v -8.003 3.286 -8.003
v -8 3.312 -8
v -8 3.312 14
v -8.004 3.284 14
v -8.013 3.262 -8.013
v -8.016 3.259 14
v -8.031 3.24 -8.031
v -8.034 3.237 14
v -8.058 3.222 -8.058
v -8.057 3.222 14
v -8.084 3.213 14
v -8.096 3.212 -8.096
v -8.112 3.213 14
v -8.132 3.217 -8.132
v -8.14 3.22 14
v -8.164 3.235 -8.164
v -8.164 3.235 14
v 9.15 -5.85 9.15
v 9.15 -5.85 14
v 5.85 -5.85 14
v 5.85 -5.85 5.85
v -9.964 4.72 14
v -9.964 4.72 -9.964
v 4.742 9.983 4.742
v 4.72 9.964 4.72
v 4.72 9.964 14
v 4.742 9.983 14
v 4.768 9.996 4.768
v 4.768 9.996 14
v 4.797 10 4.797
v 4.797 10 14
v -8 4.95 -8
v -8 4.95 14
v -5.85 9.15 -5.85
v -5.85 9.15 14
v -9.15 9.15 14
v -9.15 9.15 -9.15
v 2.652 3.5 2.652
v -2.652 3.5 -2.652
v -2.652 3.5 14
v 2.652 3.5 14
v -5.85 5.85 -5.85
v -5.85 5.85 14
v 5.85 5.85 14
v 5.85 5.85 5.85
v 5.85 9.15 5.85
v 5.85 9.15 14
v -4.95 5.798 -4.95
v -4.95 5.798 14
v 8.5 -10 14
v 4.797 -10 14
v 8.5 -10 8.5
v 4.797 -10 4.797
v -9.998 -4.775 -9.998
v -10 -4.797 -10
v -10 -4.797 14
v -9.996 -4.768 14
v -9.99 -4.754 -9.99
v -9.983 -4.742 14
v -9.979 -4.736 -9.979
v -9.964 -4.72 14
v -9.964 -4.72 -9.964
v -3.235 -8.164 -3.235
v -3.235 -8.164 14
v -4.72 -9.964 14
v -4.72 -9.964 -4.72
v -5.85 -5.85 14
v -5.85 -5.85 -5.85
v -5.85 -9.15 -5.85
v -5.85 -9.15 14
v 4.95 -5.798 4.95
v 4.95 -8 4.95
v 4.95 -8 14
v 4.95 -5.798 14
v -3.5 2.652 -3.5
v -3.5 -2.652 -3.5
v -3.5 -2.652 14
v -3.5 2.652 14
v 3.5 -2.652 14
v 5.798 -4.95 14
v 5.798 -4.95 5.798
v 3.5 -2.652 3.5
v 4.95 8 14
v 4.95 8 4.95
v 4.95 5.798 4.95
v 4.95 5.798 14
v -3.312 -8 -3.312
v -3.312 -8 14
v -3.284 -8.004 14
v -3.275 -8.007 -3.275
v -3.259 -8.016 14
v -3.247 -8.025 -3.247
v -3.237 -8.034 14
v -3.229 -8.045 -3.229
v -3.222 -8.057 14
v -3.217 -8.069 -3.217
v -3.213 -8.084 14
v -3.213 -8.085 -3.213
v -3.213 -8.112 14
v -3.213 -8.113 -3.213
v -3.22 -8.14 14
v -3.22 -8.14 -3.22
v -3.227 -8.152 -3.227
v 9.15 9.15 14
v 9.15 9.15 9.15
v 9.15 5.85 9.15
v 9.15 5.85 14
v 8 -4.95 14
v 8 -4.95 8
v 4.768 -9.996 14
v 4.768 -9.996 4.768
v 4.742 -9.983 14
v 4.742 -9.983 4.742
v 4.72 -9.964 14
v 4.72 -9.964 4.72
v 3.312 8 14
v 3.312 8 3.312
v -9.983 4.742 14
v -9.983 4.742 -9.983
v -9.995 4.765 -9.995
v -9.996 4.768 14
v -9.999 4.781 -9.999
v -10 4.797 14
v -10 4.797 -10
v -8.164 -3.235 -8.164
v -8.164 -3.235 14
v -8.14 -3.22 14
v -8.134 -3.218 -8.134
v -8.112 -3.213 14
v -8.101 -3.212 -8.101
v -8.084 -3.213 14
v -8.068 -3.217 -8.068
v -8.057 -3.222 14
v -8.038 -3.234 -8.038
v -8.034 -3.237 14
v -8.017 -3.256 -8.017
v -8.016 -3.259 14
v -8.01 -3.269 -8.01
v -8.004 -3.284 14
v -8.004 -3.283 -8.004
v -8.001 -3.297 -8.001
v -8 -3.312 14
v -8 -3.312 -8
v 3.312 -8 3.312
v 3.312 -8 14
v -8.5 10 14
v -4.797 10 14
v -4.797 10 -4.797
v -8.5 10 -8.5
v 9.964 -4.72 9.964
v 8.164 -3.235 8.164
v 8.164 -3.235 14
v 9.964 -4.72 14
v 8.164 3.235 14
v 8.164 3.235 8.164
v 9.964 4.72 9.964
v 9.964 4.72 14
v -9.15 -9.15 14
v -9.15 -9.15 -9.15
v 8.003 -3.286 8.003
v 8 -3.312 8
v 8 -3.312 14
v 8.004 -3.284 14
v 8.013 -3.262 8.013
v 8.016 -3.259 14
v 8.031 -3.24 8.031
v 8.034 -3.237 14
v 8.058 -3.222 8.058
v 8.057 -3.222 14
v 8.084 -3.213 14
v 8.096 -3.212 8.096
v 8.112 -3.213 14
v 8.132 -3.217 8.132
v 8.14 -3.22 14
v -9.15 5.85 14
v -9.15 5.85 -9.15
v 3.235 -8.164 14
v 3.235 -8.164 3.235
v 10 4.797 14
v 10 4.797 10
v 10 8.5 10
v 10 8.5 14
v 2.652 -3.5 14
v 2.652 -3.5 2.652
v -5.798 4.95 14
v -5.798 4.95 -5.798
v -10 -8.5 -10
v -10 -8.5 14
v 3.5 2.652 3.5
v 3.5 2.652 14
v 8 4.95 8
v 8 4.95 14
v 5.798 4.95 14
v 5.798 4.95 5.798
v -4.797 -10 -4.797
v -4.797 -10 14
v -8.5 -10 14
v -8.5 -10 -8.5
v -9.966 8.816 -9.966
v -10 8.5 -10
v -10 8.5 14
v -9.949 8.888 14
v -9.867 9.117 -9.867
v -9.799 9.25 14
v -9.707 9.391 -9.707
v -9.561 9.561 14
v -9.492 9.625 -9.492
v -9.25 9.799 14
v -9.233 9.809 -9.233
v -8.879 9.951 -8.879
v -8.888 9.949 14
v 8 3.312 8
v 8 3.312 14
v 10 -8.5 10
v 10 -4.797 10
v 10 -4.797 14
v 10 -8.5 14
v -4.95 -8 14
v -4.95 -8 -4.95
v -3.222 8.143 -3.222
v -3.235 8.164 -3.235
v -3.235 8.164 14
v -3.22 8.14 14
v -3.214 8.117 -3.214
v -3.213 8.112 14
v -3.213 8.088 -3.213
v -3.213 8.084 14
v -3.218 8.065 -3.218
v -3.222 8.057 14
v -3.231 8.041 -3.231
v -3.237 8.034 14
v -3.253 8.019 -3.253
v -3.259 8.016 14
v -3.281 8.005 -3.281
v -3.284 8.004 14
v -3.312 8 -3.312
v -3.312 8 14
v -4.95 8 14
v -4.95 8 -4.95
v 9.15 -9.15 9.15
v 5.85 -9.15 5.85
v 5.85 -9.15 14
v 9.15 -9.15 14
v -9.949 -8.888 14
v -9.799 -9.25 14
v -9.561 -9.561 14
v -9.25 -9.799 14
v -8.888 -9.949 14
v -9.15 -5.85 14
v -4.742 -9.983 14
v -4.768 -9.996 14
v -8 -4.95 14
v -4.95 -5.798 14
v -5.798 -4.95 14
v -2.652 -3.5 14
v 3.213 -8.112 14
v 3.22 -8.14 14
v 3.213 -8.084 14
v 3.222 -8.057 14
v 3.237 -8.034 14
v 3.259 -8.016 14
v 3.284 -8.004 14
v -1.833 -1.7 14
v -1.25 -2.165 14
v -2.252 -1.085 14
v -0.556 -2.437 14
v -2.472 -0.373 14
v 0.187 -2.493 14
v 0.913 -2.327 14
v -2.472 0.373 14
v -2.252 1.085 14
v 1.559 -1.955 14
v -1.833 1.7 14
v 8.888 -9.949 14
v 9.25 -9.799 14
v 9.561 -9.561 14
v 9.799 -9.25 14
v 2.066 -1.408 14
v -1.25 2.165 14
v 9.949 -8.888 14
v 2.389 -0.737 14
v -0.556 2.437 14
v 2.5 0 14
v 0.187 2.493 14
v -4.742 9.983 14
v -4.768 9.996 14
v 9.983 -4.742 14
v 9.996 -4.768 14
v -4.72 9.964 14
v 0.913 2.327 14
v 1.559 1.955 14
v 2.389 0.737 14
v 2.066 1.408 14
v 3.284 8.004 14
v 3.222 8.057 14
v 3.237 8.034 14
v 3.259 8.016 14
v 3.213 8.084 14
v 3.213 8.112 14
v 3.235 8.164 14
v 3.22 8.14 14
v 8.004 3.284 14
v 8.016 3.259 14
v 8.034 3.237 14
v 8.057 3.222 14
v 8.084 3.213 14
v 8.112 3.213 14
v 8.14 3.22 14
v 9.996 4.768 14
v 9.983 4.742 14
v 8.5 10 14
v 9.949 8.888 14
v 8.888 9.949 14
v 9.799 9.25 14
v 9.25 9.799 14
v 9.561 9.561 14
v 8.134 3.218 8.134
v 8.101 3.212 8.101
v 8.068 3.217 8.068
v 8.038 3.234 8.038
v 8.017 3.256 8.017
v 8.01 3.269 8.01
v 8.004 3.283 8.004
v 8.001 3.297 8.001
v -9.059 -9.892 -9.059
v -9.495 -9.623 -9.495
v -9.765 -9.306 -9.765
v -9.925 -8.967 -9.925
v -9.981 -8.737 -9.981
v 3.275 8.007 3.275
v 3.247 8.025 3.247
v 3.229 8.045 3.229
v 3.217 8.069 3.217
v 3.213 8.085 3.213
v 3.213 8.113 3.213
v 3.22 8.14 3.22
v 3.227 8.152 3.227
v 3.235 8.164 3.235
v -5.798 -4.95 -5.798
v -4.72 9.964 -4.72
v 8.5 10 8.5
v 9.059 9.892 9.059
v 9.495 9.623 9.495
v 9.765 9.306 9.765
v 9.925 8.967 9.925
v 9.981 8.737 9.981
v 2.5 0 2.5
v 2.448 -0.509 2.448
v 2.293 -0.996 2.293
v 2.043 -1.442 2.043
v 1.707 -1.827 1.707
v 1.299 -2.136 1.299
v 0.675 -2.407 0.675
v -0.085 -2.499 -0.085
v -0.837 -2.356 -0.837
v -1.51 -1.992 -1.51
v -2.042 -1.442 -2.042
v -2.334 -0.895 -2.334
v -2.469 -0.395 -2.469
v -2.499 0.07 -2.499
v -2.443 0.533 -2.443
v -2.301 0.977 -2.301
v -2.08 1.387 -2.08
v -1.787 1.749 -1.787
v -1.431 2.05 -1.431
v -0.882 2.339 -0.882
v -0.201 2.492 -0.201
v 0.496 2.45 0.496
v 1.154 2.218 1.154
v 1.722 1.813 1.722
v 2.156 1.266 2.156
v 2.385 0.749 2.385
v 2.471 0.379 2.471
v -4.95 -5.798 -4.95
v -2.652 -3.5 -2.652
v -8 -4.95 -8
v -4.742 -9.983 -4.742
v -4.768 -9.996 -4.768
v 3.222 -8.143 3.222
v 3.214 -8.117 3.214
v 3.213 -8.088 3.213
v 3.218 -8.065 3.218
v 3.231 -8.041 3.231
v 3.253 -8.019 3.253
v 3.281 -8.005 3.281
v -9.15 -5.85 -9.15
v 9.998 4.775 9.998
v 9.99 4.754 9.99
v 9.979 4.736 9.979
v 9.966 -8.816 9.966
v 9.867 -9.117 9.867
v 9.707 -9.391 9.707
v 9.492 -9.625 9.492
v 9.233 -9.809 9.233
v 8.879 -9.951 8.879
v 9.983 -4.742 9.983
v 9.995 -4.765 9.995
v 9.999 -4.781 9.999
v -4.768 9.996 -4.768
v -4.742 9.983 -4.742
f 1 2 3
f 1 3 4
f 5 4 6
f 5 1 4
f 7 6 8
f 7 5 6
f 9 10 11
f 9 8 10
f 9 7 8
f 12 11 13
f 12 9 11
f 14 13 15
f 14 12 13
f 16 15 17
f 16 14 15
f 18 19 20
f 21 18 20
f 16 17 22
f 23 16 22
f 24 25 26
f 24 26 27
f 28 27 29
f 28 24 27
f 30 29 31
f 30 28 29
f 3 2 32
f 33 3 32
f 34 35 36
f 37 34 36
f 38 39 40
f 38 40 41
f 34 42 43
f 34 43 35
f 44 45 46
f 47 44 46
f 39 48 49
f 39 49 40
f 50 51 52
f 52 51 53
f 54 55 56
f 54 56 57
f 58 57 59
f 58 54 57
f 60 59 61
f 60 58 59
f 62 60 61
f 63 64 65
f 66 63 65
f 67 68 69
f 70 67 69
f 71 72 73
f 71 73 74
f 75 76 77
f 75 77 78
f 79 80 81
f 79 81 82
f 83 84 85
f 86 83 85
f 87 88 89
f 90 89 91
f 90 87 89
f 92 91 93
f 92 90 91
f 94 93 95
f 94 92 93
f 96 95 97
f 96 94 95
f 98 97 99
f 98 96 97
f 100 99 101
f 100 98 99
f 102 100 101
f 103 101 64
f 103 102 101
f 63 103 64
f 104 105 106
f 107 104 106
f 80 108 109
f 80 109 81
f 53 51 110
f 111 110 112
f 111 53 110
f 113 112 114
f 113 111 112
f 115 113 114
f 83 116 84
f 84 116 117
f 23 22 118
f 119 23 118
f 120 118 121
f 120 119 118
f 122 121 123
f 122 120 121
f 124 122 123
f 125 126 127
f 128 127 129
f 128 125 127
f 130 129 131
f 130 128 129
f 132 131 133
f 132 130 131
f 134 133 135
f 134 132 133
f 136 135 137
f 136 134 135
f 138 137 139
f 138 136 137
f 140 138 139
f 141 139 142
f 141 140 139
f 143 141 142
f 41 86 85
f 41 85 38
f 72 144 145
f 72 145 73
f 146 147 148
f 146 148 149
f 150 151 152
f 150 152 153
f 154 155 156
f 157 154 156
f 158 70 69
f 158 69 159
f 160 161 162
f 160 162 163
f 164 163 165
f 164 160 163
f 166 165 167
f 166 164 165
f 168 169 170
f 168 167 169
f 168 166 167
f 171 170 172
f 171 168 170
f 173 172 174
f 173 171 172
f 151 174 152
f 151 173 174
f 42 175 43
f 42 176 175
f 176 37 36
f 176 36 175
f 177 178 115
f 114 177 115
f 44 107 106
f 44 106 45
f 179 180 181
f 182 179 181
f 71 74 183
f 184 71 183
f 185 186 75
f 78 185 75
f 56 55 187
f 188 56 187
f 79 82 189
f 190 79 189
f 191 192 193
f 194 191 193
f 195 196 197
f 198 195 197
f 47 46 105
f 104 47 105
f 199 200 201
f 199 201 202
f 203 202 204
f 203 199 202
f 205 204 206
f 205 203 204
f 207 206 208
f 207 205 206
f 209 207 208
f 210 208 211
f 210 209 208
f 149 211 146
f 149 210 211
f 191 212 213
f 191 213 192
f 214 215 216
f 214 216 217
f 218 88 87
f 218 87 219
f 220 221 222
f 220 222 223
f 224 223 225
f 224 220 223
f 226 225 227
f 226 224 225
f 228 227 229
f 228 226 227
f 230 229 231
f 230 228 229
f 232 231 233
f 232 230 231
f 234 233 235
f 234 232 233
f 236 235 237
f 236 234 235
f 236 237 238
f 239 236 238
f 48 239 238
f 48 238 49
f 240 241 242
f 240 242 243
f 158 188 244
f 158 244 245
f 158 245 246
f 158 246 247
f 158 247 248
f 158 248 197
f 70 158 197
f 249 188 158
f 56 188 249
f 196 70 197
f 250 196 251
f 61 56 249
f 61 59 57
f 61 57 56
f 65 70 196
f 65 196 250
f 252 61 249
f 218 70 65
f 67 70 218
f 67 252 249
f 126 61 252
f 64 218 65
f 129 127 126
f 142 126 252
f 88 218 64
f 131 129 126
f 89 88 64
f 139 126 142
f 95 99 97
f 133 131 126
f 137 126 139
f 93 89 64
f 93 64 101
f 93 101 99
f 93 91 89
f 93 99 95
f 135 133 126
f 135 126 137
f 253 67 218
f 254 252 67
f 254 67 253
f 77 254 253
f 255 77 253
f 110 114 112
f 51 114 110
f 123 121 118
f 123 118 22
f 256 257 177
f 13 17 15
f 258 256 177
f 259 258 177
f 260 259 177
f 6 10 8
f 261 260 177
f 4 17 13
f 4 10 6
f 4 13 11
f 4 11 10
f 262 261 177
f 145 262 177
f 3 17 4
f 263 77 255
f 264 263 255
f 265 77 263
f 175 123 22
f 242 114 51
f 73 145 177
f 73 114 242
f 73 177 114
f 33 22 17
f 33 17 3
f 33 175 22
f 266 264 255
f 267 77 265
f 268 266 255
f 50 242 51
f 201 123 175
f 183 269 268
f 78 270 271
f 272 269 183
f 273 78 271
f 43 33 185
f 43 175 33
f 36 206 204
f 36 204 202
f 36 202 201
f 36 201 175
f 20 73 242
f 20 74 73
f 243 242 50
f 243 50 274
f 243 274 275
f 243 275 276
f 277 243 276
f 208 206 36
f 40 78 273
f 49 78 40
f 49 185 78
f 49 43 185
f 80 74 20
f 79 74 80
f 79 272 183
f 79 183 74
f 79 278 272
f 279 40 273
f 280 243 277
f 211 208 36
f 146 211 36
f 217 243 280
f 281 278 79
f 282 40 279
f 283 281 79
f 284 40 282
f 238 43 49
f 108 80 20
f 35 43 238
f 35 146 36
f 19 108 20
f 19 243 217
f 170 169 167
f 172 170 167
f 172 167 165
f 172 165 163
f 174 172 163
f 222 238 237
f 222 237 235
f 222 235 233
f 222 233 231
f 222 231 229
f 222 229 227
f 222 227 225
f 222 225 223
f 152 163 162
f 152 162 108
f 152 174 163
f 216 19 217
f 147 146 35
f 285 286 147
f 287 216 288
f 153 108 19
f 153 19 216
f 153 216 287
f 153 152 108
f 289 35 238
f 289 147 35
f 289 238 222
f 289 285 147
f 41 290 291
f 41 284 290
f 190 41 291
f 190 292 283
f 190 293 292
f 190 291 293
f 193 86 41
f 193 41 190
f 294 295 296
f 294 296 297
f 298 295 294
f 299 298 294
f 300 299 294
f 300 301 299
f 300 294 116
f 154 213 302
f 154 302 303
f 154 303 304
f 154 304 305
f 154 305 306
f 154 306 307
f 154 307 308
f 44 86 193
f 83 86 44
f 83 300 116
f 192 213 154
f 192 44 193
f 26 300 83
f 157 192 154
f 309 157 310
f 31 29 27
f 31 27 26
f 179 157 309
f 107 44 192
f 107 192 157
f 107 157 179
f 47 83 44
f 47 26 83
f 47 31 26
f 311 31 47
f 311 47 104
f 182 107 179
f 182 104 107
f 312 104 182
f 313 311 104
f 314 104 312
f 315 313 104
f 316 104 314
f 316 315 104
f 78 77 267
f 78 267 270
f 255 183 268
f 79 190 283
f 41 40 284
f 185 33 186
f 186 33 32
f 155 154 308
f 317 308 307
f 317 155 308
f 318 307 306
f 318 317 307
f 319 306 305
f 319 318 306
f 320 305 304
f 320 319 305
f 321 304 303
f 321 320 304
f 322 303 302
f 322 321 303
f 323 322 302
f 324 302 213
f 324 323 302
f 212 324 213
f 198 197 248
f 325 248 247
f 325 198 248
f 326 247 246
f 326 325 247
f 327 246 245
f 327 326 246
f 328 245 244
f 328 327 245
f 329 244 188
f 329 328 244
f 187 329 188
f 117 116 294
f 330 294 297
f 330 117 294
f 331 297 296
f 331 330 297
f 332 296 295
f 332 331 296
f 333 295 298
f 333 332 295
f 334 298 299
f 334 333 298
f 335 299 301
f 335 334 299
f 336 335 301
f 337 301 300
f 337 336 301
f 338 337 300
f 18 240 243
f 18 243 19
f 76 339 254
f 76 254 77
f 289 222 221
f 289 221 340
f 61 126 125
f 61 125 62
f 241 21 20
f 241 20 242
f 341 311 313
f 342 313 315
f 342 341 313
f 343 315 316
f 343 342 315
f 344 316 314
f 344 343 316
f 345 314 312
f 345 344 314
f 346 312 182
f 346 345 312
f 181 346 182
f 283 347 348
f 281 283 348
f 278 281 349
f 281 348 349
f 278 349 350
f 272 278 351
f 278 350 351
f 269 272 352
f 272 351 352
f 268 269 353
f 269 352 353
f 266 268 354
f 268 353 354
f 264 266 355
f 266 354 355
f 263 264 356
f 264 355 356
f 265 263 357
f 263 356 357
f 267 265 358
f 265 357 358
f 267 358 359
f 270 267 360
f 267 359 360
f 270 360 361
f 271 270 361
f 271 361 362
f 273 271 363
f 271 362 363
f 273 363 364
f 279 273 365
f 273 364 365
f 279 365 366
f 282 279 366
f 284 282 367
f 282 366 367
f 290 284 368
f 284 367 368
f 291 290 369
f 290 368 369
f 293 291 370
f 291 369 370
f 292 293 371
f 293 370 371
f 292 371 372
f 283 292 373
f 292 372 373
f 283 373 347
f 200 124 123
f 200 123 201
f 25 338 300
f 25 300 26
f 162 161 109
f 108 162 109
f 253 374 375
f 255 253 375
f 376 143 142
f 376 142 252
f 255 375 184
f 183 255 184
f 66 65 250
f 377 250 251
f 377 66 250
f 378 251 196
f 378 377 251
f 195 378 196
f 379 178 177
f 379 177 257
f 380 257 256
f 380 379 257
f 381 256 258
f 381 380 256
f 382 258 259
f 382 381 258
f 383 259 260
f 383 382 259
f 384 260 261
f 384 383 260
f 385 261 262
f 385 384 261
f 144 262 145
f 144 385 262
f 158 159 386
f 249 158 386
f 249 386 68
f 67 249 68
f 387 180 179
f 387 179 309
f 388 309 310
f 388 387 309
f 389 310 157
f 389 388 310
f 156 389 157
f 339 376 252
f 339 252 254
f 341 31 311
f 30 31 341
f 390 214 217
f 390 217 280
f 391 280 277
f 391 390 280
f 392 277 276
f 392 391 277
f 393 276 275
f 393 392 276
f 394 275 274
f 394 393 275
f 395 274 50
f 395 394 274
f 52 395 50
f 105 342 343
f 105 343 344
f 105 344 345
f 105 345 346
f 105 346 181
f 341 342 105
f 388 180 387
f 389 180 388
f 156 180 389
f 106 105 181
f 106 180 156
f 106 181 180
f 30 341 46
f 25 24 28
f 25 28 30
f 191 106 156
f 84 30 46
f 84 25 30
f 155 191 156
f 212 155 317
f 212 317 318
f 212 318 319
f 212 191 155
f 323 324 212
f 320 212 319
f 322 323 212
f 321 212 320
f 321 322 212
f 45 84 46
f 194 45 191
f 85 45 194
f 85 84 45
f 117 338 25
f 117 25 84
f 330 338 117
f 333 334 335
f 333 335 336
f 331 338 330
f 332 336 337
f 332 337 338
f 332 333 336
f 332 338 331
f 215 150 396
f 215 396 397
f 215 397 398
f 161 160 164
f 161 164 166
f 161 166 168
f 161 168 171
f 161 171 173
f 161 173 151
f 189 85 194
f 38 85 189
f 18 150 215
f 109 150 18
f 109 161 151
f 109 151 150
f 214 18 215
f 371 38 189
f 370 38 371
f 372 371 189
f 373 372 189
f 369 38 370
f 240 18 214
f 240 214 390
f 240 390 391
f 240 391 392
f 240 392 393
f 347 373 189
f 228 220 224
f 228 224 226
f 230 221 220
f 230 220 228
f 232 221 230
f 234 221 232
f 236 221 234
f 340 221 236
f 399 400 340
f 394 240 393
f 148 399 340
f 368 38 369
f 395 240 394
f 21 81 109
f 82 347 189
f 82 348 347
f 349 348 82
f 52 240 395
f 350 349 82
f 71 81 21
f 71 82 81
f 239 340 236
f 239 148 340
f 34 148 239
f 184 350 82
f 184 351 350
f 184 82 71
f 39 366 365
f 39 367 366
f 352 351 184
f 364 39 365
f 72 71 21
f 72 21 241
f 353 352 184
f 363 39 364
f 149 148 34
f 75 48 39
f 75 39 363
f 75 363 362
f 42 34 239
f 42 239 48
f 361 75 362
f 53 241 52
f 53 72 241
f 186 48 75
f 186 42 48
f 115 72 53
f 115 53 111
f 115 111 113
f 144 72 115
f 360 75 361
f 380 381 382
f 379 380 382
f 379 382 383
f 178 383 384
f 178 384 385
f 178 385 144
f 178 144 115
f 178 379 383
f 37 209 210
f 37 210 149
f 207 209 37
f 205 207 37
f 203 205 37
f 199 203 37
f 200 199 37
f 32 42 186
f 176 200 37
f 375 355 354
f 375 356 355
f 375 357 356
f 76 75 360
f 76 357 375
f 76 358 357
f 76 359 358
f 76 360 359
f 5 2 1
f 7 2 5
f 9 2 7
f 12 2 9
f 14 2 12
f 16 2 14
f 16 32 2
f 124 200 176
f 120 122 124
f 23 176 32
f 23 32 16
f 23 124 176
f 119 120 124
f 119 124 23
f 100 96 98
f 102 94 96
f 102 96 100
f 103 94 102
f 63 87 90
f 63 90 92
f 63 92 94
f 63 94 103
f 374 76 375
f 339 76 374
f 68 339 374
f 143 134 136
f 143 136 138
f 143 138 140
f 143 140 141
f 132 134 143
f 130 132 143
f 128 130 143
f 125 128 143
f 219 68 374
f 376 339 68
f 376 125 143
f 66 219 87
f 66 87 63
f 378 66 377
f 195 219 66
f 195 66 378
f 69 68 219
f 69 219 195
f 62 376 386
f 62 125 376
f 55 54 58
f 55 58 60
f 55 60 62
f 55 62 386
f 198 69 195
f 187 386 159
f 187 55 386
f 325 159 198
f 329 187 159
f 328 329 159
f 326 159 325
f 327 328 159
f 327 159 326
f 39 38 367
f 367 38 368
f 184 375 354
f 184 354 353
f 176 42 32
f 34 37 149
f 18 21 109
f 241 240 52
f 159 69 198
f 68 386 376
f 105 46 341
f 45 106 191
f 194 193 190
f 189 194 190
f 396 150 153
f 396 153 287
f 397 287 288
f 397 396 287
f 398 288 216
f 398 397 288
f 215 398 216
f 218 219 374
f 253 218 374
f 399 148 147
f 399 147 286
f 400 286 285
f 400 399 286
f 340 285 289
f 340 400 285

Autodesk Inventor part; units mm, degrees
ref_plane "Начальная плоскость" through (0, 0, -10) normal (0, 0, 1) x (1, 0, 0)
ref_plane "Конечная плоскость" through (0, 0, 14) normal (0, 0, 1) x (1, 0, 0)
sketch "Эскиз" plane through (0, 0, 0) normal (0, 0, 1) x (1, 0, 0)
  line L0 (-14.4349, 0) -> (14.4349, 0) projected
  line L1 (0, -14) -> (0, 14) projected
  line L2 (0, 0) -> (7.5, 7.5) construction
  circle A0 centre (7.5, 7.5) radius 1.65 construction
  line L3 (5.85, 9.15) -> (9.15, 9.15)
  line L4 (9.15, 9.15) -> (9.15, 5.85)
  line L5 (9.15, 5.85) -> (5.85, 5.85)
  line L6 (5.85, 5.85) -> (5.85, 9.15)
  line L7 (3.235, 8.1636) -> (4.72, 9.9636)
  line L8 (4.7971, 10) -> (8.5, 10)
  line L9 (3.3121, 8) -> (4.95, 8)
  line L10 (4.95, 8) -> (4.95, 5.7985)
  line L11 (4.95, 5.7985) -> (2.6515, 3.5)
  line L12 (0, 3.5) -> (2.6515, 3.5)
  circle A1 centre (0, 0) radius 2.5
  line L13 (8.1636, 3.235) -> (9.9636, 4.72)
  line L14 (10, 4.7971) -> (10, 8.5)
  line L15 (8, 3.3121) -> (8, 4.95)
  line L16 (8, 4.95) -> (5.7985, 4.95)
  line L17 (5.7985, 4.95) -> (3.5, 2.6515)
  line L18 (3.5, 0) -> (3.5, 2.6515)
  arc A2 (10, 8.5) -> (8.5, 10) centre (8.5, 8.5) ccw
  line L19 (0, 0) -> (-7.5, 7.5) construction
  circle A3 centre (-7.5, 7.5) radius 1.65 construction
  line L20 (-5.85, 9.15) -> (-9.15, 9.15)
  line L21 (-9.15, 9.15) -> (-9.15, 5.85)
  line L22 (-9.15, 5.85) -> (-5.85, 5.85)
  line L23 (-5.85, 5.85) -> (-5.85, 9.15)
  line L24 (-3.235, 8.1636) -> (-4.72, 9.9636)
  line L25 (-4.7971, 10) -> (-8.5, 10)
  line L26 (-3.3121, 8) -> (-4.95, 8)
  line L27 (-4.95, 8) -> (-4.95, 5.7985)
  line L28 (-4.95, 5.7985) -> (-2.6515, 3.5)
  line L29 (0, 3.5) -> (-2.6515, 3.5)
  line L30 (-3.5, 0) -> (-3.5, 2.6515)
  line L31 (-5.7985, 4.95) -> (-3.5, 2.6515)
  line L32 (-8, 4.95) -> (-5.7985, 4.95)
  line L33 (-8, 3.3121) -> (-8, 4.95)
  line L34 (-8.1636, 3.235) -> (-9.9636, 4.72)
  line L35 (-10, 4.7971) -> (-10, 8.5)
  arc A4 (-8.5, 10) -> (-10, 8.5) centre (-8.5, 8.5) ccw
  line L36 (0, 14) -> (0, -14)
  line L37 (0, 0) -> (7.5, -7.5) construction
  circle A5 centre (7.5, -7.5) radius 1.65 construction
  line L38 (5.85, -9.15) -> (9.15, -9.15)
  line L39 (9.15, -9.15) -> (9.15, -5.85)
  line L40 (9.15, -5.85) -> (5.85, -5.85)
  line L41 (5.85, -5.85) -> (5.85, -9.15)
  line L42 (3.235, -8.1636) -> (4.72, -9.9636)
  line L43 (4.7971, -10) -> (8.5, -10)
  line L44 (3.3121, -8) -> (4.95, -8)
  line L45 (4.95, -8) -> (4.95, -5.7985)
  line L46 (4.95, -5.7985) -> (2.6515, -3.5)
  line L47 (0, -3.5) -> (2.6515, -3.5)
  line L48 (3.5, 0) -> (3.5, -2.6515)
  line L49 (5.7985, -4.95) -> (3.5, -2.6515)
  line L50 (8, -4.95) -> (5.7985, -4.95)
  line L51 (8, -3.3121) -> (8, -4.95)
  line L52 (8.1636, -3.235) -> (9.9636, -4.72)
  line L53 (10, -4.7971) -> (10, -8.5)
  arc A6 (8.5, -10) -> (10, -8.5) centre (8.5, -8.5) ccw
  line L54 (0, 0) -> (-7.5, -7.5) construction
  line L55 (-4.95, -8) -> (-4.95, -5.7985)
  line L56 (-3.3121, -8) -> (-4.95, -8)
  line L57 (-5.7985, -4.95) -> (-3.5, -2.6515)
  line L58 (-4.95, -5.7985) -> (-2.6515, -3.5)
  line L59 (-3.5, 0) -> (-3.5, -2.6515)
  line L60 (0, -3.5) -> (-2.6515, -3.5)
  circle A7 centre (-7.5, -7.5) radius 1.65 construction
  line L61 (-5.85, -5.85) -> (-5.85, -9.15)
  line L62 (-5.85, -9.15) -> (-9.15, -9.15)
  line L63 (-9.15, -9.15) -> (-9.15, -5.85)
  line L64 (-9.15, -5.85) -> (-5.85, -5.85)
  line L65 (-3.235, -8.1636) -> (-4.72, -9.9636)
  line L66 (-8, -4.95) -> (-5.7985, -4.95)
  line L67 (-8, -3.3121) -> (-8, -4.95)
  line L68 (-8.1636, -3.235) -> (-9.9636, -4.72)
  line L69 (-4.7971, -10) -> (-8.5, -10)
  line L70 (-10, -4.7971) -> (-10, -8.5)
  arc A8 (-10, -8.5) -> (-8.5, -10) centre (-8.5, -8.5) ccw
  arc A9 (3.235, 8.1636) -> (3.3121, 8) centre (3.3121, 8.1) ccw
  arc A10 (4.7971, 10) -> (4.72, 9.9636) centre (4.7971, 9.9) ccw
  arc A11 (8, 3.3121) -> (8.1636, 3.235) centre (8.1, 3.3121) ccw
  arc A12 (9.9636, 4.72) -> (10, 4.7971) centre (9.9, 4.7971) ccw
  arc A13 (-3.3121, 8) -> (-3.235, 8.1636) centre (-3.3121, 8.1) ccw
  arc A14 (-4.72, 9.9636) -> (-4.7971, 10) centre (-4.7971, 9.9) ccw
  arc A15 (-8.1636, 3.235) -> (-8, 3.3121) centre (-8.1, 3.3121) ccw
  arc A16 (-10, 4.7971) -> (-9.9636, 4.72) centre (-9.9, 4.7971) ccw
  arc A17 (-8, -3.3121) -> (-8.1636, -3.235) centre (-8.1, -3.3121) ccw
  arc A18 (-9.9636, -4.72) -> (-10, -4.7971) centre (-9.9, -4.7971) ccw
  arc A19 (-3.235, -8.1636) -> (-3.3121, -8) centre (-3.3121, -8.1) ccw
  arc A20 (-4.7971, -10) -> (-4.72, -9.9636) centre (-4.7971, -9.9) ccw
  arc A21 (4.72, -9.9636) -> (4.7971, -10) centre (4.7971, -9.9) ccw
  arc A22 (3.3121, -8) -> (3.235, -8.1636) centre (3.3121, -8.1) ccw
  arc A23 (8.1636, -3.235) -> (8, -3.3121) centre (8.1, -3.3121) ccw
  arc A24 (10, -4.7971) -> (9.9636, -4.72) centre (9.9, -4.7971) ccw
  point P0 (3.1, 8)
  point P1 (4.75, 10)
  point P2 (7.5, 9.15)
  point P3 (8, 3.1)
  point P4 (10, 4.75)
  point P5 (7.5, 5.85)
  point P6 (9.15, 7.5)
  point P7 (-3.1, 8)
  point P8 (-4.75, 10)
  point P9 (-7.5, 9.15)
  point P10 (-8, 3.1)
  point P11 (-10, 4.75)
  point P12 (-7.5, 5.85)
  point P13 (-9.15, 7.5)
  point P14 (3.1, -8)
  point P15 (4.75, -10)
  point P16 (7.5, -9.15)
  point P17 (8, -3.1)
  point P18 (10, -4.75)
  point P19 (7.5, -5.85)
  point P20 (9.15, -7.5)
  point P21 (-3.1, -8)
  point P22 (-7.5, -5.85)
  point P23 (-7.5, -9.15)
  point P24 (-9.15, -7.5)
  point P25 (-4.75, -10)
  point P26 (-8, -3.1)
  point P27 (-10, -4.75)
  dimension "d0" = 45
  dimension "d1" = 3.3
  dimension "d2" = 1.5
  dimension "d3" = 1.2
  dimension "d4" = 5
  dimension "d5" = 6.5
  dimension "d6" = 15
  dimension "d7" = 20
  dimension "d8" = 9.9
  dimension "d9" = 9.5
  dimension "d10" = 6.2
  dimension "d11" = 2
  dimension "d18" = 0.1
  dimension "d19" = 0.1
extrude "Тело" add sketch "Эскиз" along normal up to surface (24 mm away) from surface at -10 contours A1 L1 L12 L11 L10 L9 A9 L7 A10 L8 A2 L14 A12 L13 A11 L15 L16 L17 L18 L0 | L0 L48 L49 L50 L51 A23 L52 A24 L53 A6 L43 A21 L42 A22 L44 L45 L46 L47 L1 A1 | A1 L0 L30 L31 L32 L33 A15 L34 A16 L35 A4 L25 A14 L24 A13 L26 L27 L28 L29 L1 | L1 L60 L58 L55 L56 A19 L65 A20 L69 A8 L70 A18 L68 A17 L67 L66 L57 L59 L0 A1
sketch "Эскиз2" plane through (0, 0, 0) normal (0, 0, 1) x (1, 0, 0)
  line L0 (0, 0) -> (10, 0)
ref_plane "РабПлоскость3" through (0, 0, 0) normal (0, -1, 0) x (1, 0, 0)
sketch "Эскиз3" plane through (0, 0, 0) normal (0, -1, 0) x (1, 0, 0)
  line L0 (-2, -10) -> (12, -10)
  line L1 (-2, 14) -> (12, 14)
  dimension "d25" = 24
ref_plane "РабПлоскость4" through (-10, 0, -10) normal (0.7071, 0, -0.7071) x (-0.7071, 0, -0.7071)
split "Разделение1" plane through (-10, 0, -10) removes the side toward (0.7071, 0, -0.7071)
equation "\"Длина\" = 14"
equation "\"G_OFFSET_END\" = 0"
equation "\"d21\" = Длина + G_OFFSET_END"
equation "\"G_L\" = d25"
properties part number "короткая палка"
